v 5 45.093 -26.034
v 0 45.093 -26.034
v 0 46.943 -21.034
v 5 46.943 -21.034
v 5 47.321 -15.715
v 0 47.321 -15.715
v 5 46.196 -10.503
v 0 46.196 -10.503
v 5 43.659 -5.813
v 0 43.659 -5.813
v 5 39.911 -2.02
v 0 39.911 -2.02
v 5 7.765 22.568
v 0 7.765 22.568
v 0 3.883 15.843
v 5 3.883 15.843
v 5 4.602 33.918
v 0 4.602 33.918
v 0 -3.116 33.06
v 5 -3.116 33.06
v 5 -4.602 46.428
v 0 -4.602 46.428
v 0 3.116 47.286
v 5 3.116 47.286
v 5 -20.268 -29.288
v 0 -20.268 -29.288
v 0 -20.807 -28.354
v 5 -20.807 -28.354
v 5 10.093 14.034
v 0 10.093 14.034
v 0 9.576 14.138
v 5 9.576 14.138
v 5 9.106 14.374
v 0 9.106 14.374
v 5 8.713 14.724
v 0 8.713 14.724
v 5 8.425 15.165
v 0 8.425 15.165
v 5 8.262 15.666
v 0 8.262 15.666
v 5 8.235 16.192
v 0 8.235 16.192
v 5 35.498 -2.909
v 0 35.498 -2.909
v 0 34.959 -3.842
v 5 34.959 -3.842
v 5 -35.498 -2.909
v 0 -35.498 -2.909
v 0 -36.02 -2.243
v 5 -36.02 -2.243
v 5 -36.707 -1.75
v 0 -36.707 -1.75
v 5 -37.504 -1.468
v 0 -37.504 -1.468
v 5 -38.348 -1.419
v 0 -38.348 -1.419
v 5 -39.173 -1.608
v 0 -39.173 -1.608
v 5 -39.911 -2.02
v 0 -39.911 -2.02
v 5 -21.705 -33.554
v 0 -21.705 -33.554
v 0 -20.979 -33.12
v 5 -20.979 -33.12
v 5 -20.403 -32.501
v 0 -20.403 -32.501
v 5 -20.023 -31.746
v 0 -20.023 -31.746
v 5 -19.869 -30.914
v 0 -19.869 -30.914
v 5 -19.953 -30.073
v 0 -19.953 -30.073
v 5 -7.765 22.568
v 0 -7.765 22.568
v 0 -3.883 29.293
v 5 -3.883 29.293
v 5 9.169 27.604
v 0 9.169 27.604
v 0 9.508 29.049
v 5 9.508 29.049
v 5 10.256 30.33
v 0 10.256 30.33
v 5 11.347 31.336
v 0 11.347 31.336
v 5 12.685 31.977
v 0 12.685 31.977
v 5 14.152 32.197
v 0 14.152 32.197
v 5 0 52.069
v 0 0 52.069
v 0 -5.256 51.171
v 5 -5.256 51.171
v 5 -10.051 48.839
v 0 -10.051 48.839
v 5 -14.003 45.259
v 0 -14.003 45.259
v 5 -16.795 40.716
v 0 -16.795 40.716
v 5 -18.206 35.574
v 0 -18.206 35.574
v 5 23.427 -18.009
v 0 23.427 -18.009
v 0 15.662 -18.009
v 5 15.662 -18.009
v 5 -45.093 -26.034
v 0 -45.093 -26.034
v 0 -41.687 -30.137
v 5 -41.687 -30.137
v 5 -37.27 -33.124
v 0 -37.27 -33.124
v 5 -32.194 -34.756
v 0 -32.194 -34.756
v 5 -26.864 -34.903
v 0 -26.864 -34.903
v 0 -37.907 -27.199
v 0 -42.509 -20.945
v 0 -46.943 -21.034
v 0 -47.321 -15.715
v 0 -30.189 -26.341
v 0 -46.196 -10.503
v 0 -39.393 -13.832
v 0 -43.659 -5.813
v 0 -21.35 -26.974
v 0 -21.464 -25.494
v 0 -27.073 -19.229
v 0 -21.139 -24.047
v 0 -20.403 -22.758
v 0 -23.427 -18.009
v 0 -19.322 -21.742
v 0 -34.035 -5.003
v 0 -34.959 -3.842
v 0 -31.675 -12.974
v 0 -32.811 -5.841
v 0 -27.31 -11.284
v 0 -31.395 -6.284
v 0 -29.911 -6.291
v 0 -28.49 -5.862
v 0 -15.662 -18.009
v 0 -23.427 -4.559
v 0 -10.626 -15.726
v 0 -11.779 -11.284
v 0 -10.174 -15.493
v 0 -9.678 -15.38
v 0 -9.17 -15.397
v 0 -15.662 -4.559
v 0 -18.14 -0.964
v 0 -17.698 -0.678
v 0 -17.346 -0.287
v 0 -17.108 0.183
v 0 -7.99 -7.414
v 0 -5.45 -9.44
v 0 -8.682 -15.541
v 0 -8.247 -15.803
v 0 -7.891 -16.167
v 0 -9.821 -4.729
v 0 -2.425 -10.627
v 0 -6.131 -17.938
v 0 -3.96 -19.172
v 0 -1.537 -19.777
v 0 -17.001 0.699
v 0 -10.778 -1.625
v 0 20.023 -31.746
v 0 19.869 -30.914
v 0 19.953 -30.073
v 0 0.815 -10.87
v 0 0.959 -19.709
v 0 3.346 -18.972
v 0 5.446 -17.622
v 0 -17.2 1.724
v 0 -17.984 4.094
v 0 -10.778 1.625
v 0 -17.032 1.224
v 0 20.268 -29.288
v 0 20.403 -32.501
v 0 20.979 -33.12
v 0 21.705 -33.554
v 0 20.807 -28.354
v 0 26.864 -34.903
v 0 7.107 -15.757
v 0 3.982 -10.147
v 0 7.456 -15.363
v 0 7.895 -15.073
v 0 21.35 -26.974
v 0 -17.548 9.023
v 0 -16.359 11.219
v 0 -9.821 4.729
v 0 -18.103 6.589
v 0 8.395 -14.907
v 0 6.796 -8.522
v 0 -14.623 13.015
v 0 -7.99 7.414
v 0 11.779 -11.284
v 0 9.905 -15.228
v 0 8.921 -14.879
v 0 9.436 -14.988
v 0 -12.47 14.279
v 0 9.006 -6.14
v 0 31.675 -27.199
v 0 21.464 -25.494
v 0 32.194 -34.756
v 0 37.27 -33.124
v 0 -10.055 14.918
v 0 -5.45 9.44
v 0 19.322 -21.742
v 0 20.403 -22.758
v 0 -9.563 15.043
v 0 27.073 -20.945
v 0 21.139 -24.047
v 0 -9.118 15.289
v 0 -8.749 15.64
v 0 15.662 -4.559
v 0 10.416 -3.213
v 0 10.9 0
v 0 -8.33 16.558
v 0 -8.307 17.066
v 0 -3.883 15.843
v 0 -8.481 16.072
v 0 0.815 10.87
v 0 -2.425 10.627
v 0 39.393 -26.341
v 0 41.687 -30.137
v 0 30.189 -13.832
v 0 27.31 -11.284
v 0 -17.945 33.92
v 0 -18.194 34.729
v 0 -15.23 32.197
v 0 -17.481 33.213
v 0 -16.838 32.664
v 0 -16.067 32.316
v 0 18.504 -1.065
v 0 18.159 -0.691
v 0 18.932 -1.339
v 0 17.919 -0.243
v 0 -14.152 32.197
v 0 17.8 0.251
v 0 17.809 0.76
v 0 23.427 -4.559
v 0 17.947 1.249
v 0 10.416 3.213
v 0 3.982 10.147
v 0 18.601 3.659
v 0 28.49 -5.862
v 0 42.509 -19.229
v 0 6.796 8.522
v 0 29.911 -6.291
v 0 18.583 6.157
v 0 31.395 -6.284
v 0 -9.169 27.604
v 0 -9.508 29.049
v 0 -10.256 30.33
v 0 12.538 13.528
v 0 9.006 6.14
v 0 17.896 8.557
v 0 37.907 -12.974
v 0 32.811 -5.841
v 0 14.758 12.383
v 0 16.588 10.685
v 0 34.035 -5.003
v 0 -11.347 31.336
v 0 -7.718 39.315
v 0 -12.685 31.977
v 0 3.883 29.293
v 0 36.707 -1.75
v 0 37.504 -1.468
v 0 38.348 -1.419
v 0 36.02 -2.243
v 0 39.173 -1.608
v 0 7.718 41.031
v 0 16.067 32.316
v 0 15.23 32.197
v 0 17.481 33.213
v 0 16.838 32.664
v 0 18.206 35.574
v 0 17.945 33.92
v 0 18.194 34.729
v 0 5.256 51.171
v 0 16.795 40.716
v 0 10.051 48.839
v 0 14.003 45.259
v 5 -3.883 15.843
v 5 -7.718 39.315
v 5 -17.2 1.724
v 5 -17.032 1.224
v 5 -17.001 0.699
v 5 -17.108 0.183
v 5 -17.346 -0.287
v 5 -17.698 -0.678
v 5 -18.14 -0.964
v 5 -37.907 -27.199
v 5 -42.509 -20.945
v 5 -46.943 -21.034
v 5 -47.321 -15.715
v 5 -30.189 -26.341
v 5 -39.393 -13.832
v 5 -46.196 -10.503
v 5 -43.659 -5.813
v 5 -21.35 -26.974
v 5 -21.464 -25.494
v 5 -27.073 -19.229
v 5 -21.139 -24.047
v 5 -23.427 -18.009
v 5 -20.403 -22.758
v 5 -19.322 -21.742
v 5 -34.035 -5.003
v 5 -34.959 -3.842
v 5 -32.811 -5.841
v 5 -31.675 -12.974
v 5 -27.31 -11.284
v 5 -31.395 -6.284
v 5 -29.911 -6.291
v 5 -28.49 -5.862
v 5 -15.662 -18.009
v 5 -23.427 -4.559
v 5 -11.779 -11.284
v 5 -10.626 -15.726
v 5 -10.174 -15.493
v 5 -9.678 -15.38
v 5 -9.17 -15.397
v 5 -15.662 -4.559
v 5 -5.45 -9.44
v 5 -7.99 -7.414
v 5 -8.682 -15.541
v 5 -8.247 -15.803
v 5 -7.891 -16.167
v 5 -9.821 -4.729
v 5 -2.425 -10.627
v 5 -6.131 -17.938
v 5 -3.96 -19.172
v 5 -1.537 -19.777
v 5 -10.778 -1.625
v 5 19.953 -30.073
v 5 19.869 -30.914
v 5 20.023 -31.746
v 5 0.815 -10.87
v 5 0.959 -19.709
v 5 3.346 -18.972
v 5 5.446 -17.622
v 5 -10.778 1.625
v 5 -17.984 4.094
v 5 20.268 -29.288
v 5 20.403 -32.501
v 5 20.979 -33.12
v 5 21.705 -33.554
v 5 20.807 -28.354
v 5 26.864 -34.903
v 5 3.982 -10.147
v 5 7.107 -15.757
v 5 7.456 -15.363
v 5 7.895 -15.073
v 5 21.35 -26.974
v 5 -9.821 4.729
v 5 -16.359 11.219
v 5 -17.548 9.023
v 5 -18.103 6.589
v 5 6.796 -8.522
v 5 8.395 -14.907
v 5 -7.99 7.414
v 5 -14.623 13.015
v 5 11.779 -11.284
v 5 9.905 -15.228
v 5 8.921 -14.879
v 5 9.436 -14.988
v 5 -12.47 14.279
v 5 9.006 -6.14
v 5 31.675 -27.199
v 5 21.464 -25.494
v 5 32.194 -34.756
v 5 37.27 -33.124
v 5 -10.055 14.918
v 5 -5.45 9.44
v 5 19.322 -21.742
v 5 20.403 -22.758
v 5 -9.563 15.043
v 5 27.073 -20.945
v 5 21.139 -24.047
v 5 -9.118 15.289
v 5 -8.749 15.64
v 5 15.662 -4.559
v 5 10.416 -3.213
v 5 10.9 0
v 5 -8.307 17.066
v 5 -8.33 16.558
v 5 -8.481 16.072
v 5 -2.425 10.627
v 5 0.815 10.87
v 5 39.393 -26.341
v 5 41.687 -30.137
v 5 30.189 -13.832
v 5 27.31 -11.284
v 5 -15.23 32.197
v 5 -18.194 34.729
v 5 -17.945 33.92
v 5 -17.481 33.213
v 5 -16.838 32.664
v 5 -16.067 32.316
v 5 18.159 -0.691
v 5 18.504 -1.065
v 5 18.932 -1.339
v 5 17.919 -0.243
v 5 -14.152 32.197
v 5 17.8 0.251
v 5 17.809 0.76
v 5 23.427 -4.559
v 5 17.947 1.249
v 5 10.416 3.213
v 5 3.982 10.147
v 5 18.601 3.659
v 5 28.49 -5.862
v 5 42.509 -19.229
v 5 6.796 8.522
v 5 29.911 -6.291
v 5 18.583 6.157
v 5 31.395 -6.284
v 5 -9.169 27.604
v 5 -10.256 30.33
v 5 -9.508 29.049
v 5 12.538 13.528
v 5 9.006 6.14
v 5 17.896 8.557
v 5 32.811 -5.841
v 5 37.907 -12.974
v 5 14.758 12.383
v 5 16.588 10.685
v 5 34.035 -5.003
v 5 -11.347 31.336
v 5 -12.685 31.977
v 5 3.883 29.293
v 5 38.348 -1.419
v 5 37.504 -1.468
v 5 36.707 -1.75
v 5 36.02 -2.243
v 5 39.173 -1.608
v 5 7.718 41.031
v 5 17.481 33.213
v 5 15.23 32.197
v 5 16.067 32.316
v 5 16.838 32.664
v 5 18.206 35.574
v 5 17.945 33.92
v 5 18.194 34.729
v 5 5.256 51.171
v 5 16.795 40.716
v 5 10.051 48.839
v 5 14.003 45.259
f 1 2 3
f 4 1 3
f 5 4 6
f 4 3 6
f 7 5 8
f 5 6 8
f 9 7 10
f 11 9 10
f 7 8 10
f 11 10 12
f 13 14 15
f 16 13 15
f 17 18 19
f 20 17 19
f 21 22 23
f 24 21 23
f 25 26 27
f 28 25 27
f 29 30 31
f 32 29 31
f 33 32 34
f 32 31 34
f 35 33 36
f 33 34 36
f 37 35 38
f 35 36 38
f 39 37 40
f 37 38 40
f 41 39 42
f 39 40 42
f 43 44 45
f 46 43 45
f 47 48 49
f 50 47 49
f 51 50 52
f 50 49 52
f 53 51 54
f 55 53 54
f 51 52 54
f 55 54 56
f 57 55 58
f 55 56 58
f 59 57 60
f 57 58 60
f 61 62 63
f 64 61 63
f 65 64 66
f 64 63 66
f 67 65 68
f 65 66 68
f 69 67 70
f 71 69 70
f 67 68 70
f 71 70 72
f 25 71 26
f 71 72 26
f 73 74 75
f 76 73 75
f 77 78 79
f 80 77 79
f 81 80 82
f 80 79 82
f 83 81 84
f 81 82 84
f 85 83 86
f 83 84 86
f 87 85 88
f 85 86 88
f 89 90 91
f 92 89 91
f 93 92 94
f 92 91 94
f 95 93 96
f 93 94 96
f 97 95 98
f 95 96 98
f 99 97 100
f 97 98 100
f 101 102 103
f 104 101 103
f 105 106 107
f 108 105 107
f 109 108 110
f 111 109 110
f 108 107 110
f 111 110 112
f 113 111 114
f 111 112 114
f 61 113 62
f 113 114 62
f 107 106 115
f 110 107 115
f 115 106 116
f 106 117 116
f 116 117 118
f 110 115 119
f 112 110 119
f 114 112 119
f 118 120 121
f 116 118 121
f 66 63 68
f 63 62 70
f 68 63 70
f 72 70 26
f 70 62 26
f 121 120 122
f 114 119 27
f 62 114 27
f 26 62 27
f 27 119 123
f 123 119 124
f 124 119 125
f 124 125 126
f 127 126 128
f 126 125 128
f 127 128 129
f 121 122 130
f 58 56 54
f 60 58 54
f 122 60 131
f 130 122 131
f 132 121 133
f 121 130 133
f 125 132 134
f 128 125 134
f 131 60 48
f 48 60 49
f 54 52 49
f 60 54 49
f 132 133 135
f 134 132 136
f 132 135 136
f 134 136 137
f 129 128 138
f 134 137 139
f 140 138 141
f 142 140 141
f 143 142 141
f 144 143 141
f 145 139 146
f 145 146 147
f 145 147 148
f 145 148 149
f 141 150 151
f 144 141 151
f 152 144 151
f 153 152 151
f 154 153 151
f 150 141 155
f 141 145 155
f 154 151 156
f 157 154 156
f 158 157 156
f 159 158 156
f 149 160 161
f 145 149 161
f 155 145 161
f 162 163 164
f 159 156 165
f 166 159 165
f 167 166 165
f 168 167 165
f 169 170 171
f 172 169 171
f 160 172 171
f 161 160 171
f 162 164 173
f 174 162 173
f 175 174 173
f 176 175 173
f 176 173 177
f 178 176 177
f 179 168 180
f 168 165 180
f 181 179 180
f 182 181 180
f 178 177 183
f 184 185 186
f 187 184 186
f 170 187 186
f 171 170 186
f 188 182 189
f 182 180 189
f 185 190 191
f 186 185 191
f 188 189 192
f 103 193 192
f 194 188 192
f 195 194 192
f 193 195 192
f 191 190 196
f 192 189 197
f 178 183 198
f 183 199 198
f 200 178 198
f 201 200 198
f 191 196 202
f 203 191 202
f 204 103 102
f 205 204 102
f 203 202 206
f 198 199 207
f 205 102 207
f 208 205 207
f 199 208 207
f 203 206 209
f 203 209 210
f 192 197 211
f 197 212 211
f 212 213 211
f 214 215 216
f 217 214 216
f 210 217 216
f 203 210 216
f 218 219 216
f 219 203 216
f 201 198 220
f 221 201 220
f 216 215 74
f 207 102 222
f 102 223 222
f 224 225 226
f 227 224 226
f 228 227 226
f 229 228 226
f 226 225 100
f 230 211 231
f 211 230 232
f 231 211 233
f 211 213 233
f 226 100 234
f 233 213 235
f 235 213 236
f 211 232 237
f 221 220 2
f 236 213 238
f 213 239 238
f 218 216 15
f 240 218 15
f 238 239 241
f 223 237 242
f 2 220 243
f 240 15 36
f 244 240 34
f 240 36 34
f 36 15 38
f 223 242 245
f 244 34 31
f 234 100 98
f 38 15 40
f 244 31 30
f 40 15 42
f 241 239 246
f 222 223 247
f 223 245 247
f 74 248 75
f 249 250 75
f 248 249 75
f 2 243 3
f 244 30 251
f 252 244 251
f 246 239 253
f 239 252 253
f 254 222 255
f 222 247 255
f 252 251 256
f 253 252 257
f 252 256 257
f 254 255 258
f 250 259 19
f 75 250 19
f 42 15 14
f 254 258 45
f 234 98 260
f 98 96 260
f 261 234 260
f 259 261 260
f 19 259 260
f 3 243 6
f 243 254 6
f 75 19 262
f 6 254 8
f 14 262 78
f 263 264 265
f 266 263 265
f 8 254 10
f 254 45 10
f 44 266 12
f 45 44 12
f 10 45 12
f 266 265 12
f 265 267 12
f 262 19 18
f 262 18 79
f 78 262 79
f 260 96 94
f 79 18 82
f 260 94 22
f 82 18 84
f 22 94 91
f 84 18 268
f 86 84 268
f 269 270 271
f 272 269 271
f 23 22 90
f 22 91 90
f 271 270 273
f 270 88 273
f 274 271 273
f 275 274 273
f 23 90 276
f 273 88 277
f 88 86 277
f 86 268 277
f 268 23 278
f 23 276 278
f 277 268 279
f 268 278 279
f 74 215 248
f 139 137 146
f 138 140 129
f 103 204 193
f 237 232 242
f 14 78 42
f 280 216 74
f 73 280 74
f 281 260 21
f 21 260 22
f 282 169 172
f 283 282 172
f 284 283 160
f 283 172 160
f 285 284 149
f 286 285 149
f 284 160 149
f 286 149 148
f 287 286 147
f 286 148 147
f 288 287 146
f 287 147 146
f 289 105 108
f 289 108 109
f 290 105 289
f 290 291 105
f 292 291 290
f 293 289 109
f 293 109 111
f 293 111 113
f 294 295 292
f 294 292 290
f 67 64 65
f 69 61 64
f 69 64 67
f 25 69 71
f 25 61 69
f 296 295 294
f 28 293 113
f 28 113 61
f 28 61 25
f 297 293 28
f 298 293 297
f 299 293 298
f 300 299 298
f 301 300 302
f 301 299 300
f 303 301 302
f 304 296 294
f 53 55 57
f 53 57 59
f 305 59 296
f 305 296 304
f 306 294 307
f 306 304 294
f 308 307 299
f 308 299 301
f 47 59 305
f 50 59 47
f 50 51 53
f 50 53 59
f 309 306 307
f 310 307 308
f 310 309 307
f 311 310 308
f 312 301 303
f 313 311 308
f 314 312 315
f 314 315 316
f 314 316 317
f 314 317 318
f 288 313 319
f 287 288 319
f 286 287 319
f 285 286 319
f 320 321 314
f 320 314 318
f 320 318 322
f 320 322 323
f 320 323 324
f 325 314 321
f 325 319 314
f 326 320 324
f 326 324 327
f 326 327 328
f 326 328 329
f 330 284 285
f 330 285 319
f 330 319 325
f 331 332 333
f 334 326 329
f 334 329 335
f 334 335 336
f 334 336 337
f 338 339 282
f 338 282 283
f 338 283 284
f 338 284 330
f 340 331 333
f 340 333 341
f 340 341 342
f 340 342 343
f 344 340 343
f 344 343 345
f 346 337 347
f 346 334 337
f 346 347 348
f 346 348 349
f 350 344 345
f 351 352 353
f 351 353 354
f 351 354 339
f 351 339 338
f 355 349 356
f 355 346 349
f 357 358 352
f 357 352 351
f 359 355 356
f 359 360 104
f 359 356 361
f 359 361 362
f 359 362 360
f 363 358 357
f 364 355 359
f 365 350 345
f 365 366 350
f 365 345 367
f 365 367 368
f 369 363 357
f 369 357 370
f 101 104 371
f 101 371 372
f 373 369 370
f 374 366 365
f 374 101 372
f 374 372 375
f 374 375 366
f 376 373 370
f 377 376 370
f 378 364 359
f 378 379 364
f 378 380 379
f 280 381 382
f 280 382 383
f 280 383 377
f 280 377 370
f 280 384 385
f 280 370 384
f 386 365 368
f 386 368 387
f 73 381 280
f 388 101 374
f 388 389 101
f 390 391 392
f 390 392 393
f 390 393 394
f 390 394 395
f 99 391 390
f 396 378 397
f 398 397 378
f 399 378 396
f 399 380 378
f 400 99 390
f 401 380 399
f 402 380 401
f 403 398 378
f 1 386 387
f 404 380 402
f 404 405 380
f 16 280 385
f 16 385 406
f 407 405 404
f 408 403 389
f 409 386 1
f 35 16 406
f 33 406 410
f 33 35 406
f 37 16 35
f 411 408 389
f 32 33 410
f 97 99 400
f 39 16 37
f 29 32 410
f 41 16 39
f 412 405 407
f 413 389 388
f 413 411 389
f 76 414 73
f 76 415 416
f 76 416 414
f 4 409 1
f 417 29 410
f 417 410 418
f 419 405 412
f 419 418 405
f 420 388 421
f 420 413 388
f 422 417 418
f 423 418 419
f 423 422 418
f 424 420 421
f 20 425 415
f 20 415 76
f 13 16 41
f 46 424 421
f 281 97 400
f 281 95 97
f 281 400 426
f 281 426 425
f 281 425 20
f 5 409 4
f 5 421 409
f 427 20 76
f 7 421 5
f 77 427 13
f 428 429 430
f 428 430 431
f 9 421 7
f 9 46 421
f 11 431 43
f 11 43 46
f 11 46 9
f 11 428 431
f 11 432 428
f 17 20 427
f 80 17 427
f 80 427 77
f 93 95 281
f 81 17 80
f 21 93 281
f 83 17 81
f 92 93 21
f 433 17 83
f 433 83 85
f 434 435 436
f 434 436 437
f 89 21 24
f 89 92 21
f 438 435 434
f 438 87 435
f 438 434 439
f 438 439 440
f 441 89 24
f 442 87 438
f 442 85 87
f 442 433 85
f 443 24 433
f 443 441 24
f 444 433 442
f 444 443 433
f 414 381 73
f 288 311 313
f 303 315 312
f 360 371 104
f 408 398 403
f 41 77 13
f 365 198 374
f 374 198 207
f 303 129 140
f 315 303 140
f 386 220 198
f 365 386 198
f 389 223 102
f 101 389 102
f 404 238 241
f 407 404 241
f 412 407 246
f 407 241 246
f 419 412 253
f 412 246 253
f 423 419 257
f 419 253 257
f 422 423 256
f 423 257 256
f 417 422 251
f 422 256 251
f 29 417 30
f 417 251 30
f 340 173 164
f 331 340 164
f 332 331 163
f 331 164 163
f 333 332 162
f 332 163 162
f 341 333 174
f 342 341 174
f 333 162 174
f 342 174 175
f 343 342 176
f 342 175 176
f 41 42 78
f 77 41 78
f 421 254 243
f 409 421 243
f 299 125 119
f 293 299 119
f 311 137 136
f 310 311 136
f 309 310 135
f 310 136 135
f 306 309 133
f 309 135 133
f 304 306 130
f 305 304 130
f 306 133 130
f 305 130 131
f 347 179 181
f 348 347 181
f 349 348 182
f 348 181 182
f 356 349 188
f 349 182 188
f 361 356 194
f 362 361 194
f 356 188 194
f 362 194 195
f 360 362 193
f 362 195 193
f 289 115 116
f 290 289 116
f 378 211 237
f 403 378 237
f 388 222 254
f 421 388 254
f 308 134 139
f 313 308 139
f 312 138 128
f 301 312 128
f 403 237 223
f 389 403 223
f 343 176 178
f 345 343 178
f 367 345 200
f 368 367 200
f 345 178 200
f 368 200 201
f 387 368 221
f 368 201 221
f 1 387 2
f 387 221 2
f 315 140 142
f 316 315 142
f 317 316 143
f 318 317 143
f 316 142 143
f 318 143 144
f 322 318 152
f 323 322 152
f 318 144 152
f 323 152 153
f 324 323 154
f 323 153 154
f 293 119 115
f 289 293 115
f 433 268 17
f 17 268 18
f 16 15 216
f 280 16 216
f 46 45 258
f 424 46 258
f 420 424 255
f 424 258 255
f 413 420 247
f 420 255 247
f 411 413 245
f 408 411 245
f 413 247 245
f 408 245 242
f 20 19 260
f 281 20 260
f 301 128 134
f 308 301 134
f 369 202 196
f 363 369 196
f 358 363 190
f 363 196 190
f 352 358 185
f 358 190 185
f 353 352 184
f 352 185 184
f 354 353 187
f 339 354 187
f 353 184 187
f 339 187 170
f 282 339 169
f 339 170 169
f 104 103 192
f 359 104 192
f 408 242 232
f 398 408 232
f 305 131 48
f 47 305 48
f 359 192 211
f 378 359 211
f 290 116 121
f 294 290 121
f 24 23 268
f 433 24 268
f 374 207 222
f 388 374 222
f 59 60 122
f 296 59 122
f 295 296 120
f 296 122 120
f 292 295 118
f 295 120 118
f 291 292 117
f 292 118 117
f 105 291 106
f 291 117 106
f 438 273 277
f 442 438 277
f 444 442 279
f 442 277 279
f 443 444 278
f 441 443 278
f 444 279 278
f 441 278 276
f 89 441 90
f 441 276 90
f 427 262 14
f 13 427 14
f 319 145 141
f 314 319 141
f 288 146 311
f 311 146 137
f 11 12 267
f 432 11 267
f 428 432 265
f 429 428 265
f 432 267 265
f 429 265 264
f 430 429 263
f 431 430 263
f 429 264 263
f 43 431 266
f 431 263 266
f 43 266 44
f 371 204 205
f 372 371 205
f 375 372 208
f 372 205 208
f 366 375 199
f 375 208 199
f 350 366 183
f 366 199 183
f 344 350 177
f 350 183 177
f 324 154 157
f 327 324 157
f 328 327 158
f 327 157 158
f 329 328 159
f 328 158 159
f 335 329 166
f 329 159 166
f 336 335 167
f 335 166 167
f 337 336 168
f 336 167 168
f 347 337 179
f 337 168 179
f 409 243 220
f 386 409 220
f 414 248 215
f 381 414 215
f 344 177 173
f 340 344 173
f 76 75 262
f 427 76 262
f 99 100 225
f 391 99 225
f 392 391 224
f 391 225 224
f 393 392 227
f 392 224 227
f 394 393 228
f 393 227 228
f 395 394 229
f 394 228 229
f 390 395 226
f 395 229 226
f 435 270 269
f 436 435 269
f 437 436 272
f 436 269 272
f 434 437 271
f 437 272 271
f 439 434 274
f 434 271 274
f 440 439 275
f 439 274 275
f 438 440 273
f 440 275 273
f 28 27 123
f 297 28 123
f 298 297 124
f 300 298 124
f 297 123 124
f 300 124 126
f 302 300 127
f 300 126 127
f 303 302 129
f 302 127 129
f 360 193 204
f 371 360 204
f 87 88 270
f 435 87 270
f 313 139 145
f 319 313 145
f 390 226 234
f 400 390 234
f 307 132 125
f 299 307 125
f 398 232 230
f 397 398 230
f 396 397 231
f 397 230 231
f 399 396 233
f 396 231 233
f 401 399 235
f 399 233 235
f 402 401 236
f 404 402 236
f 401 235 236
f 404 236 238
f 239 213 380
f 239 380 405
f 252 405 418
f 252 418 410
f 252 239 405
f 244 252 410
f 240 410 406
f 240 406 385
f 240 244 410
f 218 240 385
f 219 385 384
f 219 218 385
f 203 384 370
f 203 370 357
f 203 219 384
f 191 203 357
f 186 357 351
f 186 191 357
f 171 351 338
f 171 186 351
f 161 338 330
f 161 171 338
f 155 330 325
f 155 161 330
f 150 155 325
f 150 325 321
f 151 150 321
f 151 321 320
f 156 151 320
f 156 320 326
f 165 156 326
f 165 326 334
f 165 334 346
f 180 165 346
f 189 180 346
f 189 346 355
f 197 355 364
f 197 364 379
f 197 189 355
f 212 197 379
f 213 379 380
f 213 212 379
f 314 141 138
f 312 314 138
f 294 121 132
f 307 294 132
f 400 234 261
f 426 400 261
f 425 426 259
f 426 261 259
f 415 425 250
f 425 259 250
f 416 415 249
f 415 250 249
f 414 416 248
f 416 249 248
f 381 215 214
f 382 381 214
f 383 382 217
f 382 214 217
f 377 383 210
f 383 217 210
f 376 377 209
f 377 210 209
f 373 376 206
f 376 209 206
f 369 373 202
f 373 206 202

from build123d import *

# Parameters (mm, degrees)
F0_R     = 10.9
F1_DEPTH = 5


with BuildPart() as f1:
    # F0 (on Right) → F1 (new body)
    with BuildSketch(Plane.YZ):
        with BuildLine():
            Line((-9.16856, 27.604424), (-8.306591, 17.065519))
            ThreePointArc((-8.306591, 17.065519), (-8.74893, 15.639796), (-10.055313, 14.917501))
            ThreePointArc((-10.055313, 14.917501), (-17.028002, 10.161932), (-17.199707, 1.723666))
            ThreePointArc((-17.199707, 1.723666), (-17.107939, 0.1831), (-18.140222, -0.964137))
            Line((-18.140222, -0.964137), (-28.490412, -5.862006))
            ThreePointArc((-28.490412, -5.862006), (-32.119144, -6.115317), (-34.95924, -3.842497))
            Line((-34.95924, -3.842497), (-35.498432, -2.908589))
            ThreePointArc((-35.498432, -2.908589), (-37.504185, -1.467645), (-39.911359, -2.019799))
            ThreePointArc((-39.911359, -2.019799), (-46.943646, -13.068777), (-45.092936, -26.034418))
            ThreePointArc((-45.092936, -26.034418), (-34.789716, -34.120001), (-21.704877, -33.554351))
            ThreePointArc((-21.704877, -33.554351), (-20.02311, -31.745754), (-20.268128, -29.28825))
            Line((-20.268128, -29.28825), (-20.80732, -28.354341))
            ThreePointArc((-20.80732, -28.354341), (-21.355591, -24.758336), (-19.321852, -21.742418))
            Line((-19.321852, -21.742418), (-10.625877, -15.726479))
            ThreePointArc((-10.625877, -15.726479), (-9.169996, -15.396694), (-7.891278, -16.166907))
            ThreePointArc((-7.891278, -16.166907), (-0.286491, -19.827648), (7.107115, -15.757216))
            ThreePointArc((7.107115, -15.757216), (8.3954, -14.90746), (9.905079, -15.227825))
            Line((9.905079, -15.227825), (19.321852, -21.742418))
            ThreePointArc((19.321852, -21.742418), (21.355591, -24.758336), (20.80732, -28.354341))
            Line((20.80732, -28.354341), (20.268128, -29.28825))
            ThreePointArc((20.268128, -29.28825), (20.02311, -31.745754), (21.704877, -33.554351))
            ThreePointArc((21.704877, -33.554351), (34.789716, -34.120001), (45.092936, -26.034418))
            ThreePointArc((45.092936, -26.034418), (46.943646, -13.068777), (39.911359, -2.019799))
            ThreePointArc((39.911359, -2.019799), (37.504185, -1.467645), (35.498432, -2.908589))
            Line((35.498432, -2.908589), (34.95924, -3.842497))
            ThreePointArc((34.95924, -3.842497), (32.119144, -6.115317), (28.490412, -5.862006))
            Line((28.490412, -5.862006), (18.932469, -1.339041))
            ThreePointArc((18.932469, -1.339041), (17.918926, -0.243103), (17.946592, 1.249406))
            ThreePointArc((17.946592, 1.249406), (17.314492, 9.665716), (10.092592, 14.03355))
            ThreePointArc((10.092592, 14.03355), (8.712539, 14.724359), (8.235144, 16.191962))
            Line((8.235144, 16.191962), (9.16856, 27.604424))
            ThreePointArc((9.16856, 27.604424), (10.763552, 30.873653), (14.15192, 32.196838))
            Line((14.15192, 32.196838), (15.230304, 32.196838))
            ThreePointArc((15.230304, 32.196838), (17.481075, 33.213399), (18.206482, 35.574151))
            ThreePointArc((18.206482, 35.574151), (12.15393, 47.188779), (0, 52.068837))
            ThreePointArc((0, 52.068837), (-12.15393, 47.188779), (-18.206482, 35.574151))
            ThreePointArc((-18.206482, 35.574151), (-17.481075, 33.213399), (-15.230304, 32.196838))
            Line((-15.230304, 32.196838), (-14.15192, 32.196838))
            ThreePointArc((-14.15192, 32.196838), (-10.763552, 30.873653), (-9.16856, 27.604424))
        make_face()
        Polygon((-30.1891, -26.341452), (-37.906917, -27.199435), (-42.50886, -20.944601), (-39.392987, -13.831784), (-31.67517, -12.973801), (-27.073227, -19.228635), align=None, mode=Mode.SUBTRACT)
        Polygon((-23.427465, -18.009187), (-27.310145, -11.284187), (-23.427465, -4.559187), (-15.662104, -4.559187), (-11.779423, -11.284187), (-15.662104, -18.009187), align=None, mode=Mode.SUBTRACT)
        Polygon((37.906917, -12.973801), (42.50886, -19.228635), (39.392987, -26.341452), (31.67517, -27.199435), (27.073227, -20.944601), (30.1891, -13.831784), align=None, mode=Mode.SUBTRACT)
        Circle(F0_R, mode=Mode.SUBTRACT)
        Polygon((27.310145, -11.284187), (23.427465, -18.009187), (15.662104, -18.009187), (11.779423, -11.284187), (15.662104, -4.559187), (23.427465, -4.559187), align=None, mode=Mode.SUBTRACT)
        Polygon((-7.765361, 22.568373), (-3.882681, 29.293373), (3.882681, 29.293373), (7.765361, 22.568373), (3.882681, 15.843373), (-3.882681, 15.843373), align=None, mode=Mode.SUBTRACT)
        Polygon((-3.115874, 33.06042), (-7.717817, 39.315254), (-4.601943, 46.428071), (3.115874, 47.286054), (7.717817, 41.03122), (4.601943, 33.918403), align=None, mode=Mode.SUBTRACT)
    extrude(amount=F1_DEPTH)


solid = f1.part
